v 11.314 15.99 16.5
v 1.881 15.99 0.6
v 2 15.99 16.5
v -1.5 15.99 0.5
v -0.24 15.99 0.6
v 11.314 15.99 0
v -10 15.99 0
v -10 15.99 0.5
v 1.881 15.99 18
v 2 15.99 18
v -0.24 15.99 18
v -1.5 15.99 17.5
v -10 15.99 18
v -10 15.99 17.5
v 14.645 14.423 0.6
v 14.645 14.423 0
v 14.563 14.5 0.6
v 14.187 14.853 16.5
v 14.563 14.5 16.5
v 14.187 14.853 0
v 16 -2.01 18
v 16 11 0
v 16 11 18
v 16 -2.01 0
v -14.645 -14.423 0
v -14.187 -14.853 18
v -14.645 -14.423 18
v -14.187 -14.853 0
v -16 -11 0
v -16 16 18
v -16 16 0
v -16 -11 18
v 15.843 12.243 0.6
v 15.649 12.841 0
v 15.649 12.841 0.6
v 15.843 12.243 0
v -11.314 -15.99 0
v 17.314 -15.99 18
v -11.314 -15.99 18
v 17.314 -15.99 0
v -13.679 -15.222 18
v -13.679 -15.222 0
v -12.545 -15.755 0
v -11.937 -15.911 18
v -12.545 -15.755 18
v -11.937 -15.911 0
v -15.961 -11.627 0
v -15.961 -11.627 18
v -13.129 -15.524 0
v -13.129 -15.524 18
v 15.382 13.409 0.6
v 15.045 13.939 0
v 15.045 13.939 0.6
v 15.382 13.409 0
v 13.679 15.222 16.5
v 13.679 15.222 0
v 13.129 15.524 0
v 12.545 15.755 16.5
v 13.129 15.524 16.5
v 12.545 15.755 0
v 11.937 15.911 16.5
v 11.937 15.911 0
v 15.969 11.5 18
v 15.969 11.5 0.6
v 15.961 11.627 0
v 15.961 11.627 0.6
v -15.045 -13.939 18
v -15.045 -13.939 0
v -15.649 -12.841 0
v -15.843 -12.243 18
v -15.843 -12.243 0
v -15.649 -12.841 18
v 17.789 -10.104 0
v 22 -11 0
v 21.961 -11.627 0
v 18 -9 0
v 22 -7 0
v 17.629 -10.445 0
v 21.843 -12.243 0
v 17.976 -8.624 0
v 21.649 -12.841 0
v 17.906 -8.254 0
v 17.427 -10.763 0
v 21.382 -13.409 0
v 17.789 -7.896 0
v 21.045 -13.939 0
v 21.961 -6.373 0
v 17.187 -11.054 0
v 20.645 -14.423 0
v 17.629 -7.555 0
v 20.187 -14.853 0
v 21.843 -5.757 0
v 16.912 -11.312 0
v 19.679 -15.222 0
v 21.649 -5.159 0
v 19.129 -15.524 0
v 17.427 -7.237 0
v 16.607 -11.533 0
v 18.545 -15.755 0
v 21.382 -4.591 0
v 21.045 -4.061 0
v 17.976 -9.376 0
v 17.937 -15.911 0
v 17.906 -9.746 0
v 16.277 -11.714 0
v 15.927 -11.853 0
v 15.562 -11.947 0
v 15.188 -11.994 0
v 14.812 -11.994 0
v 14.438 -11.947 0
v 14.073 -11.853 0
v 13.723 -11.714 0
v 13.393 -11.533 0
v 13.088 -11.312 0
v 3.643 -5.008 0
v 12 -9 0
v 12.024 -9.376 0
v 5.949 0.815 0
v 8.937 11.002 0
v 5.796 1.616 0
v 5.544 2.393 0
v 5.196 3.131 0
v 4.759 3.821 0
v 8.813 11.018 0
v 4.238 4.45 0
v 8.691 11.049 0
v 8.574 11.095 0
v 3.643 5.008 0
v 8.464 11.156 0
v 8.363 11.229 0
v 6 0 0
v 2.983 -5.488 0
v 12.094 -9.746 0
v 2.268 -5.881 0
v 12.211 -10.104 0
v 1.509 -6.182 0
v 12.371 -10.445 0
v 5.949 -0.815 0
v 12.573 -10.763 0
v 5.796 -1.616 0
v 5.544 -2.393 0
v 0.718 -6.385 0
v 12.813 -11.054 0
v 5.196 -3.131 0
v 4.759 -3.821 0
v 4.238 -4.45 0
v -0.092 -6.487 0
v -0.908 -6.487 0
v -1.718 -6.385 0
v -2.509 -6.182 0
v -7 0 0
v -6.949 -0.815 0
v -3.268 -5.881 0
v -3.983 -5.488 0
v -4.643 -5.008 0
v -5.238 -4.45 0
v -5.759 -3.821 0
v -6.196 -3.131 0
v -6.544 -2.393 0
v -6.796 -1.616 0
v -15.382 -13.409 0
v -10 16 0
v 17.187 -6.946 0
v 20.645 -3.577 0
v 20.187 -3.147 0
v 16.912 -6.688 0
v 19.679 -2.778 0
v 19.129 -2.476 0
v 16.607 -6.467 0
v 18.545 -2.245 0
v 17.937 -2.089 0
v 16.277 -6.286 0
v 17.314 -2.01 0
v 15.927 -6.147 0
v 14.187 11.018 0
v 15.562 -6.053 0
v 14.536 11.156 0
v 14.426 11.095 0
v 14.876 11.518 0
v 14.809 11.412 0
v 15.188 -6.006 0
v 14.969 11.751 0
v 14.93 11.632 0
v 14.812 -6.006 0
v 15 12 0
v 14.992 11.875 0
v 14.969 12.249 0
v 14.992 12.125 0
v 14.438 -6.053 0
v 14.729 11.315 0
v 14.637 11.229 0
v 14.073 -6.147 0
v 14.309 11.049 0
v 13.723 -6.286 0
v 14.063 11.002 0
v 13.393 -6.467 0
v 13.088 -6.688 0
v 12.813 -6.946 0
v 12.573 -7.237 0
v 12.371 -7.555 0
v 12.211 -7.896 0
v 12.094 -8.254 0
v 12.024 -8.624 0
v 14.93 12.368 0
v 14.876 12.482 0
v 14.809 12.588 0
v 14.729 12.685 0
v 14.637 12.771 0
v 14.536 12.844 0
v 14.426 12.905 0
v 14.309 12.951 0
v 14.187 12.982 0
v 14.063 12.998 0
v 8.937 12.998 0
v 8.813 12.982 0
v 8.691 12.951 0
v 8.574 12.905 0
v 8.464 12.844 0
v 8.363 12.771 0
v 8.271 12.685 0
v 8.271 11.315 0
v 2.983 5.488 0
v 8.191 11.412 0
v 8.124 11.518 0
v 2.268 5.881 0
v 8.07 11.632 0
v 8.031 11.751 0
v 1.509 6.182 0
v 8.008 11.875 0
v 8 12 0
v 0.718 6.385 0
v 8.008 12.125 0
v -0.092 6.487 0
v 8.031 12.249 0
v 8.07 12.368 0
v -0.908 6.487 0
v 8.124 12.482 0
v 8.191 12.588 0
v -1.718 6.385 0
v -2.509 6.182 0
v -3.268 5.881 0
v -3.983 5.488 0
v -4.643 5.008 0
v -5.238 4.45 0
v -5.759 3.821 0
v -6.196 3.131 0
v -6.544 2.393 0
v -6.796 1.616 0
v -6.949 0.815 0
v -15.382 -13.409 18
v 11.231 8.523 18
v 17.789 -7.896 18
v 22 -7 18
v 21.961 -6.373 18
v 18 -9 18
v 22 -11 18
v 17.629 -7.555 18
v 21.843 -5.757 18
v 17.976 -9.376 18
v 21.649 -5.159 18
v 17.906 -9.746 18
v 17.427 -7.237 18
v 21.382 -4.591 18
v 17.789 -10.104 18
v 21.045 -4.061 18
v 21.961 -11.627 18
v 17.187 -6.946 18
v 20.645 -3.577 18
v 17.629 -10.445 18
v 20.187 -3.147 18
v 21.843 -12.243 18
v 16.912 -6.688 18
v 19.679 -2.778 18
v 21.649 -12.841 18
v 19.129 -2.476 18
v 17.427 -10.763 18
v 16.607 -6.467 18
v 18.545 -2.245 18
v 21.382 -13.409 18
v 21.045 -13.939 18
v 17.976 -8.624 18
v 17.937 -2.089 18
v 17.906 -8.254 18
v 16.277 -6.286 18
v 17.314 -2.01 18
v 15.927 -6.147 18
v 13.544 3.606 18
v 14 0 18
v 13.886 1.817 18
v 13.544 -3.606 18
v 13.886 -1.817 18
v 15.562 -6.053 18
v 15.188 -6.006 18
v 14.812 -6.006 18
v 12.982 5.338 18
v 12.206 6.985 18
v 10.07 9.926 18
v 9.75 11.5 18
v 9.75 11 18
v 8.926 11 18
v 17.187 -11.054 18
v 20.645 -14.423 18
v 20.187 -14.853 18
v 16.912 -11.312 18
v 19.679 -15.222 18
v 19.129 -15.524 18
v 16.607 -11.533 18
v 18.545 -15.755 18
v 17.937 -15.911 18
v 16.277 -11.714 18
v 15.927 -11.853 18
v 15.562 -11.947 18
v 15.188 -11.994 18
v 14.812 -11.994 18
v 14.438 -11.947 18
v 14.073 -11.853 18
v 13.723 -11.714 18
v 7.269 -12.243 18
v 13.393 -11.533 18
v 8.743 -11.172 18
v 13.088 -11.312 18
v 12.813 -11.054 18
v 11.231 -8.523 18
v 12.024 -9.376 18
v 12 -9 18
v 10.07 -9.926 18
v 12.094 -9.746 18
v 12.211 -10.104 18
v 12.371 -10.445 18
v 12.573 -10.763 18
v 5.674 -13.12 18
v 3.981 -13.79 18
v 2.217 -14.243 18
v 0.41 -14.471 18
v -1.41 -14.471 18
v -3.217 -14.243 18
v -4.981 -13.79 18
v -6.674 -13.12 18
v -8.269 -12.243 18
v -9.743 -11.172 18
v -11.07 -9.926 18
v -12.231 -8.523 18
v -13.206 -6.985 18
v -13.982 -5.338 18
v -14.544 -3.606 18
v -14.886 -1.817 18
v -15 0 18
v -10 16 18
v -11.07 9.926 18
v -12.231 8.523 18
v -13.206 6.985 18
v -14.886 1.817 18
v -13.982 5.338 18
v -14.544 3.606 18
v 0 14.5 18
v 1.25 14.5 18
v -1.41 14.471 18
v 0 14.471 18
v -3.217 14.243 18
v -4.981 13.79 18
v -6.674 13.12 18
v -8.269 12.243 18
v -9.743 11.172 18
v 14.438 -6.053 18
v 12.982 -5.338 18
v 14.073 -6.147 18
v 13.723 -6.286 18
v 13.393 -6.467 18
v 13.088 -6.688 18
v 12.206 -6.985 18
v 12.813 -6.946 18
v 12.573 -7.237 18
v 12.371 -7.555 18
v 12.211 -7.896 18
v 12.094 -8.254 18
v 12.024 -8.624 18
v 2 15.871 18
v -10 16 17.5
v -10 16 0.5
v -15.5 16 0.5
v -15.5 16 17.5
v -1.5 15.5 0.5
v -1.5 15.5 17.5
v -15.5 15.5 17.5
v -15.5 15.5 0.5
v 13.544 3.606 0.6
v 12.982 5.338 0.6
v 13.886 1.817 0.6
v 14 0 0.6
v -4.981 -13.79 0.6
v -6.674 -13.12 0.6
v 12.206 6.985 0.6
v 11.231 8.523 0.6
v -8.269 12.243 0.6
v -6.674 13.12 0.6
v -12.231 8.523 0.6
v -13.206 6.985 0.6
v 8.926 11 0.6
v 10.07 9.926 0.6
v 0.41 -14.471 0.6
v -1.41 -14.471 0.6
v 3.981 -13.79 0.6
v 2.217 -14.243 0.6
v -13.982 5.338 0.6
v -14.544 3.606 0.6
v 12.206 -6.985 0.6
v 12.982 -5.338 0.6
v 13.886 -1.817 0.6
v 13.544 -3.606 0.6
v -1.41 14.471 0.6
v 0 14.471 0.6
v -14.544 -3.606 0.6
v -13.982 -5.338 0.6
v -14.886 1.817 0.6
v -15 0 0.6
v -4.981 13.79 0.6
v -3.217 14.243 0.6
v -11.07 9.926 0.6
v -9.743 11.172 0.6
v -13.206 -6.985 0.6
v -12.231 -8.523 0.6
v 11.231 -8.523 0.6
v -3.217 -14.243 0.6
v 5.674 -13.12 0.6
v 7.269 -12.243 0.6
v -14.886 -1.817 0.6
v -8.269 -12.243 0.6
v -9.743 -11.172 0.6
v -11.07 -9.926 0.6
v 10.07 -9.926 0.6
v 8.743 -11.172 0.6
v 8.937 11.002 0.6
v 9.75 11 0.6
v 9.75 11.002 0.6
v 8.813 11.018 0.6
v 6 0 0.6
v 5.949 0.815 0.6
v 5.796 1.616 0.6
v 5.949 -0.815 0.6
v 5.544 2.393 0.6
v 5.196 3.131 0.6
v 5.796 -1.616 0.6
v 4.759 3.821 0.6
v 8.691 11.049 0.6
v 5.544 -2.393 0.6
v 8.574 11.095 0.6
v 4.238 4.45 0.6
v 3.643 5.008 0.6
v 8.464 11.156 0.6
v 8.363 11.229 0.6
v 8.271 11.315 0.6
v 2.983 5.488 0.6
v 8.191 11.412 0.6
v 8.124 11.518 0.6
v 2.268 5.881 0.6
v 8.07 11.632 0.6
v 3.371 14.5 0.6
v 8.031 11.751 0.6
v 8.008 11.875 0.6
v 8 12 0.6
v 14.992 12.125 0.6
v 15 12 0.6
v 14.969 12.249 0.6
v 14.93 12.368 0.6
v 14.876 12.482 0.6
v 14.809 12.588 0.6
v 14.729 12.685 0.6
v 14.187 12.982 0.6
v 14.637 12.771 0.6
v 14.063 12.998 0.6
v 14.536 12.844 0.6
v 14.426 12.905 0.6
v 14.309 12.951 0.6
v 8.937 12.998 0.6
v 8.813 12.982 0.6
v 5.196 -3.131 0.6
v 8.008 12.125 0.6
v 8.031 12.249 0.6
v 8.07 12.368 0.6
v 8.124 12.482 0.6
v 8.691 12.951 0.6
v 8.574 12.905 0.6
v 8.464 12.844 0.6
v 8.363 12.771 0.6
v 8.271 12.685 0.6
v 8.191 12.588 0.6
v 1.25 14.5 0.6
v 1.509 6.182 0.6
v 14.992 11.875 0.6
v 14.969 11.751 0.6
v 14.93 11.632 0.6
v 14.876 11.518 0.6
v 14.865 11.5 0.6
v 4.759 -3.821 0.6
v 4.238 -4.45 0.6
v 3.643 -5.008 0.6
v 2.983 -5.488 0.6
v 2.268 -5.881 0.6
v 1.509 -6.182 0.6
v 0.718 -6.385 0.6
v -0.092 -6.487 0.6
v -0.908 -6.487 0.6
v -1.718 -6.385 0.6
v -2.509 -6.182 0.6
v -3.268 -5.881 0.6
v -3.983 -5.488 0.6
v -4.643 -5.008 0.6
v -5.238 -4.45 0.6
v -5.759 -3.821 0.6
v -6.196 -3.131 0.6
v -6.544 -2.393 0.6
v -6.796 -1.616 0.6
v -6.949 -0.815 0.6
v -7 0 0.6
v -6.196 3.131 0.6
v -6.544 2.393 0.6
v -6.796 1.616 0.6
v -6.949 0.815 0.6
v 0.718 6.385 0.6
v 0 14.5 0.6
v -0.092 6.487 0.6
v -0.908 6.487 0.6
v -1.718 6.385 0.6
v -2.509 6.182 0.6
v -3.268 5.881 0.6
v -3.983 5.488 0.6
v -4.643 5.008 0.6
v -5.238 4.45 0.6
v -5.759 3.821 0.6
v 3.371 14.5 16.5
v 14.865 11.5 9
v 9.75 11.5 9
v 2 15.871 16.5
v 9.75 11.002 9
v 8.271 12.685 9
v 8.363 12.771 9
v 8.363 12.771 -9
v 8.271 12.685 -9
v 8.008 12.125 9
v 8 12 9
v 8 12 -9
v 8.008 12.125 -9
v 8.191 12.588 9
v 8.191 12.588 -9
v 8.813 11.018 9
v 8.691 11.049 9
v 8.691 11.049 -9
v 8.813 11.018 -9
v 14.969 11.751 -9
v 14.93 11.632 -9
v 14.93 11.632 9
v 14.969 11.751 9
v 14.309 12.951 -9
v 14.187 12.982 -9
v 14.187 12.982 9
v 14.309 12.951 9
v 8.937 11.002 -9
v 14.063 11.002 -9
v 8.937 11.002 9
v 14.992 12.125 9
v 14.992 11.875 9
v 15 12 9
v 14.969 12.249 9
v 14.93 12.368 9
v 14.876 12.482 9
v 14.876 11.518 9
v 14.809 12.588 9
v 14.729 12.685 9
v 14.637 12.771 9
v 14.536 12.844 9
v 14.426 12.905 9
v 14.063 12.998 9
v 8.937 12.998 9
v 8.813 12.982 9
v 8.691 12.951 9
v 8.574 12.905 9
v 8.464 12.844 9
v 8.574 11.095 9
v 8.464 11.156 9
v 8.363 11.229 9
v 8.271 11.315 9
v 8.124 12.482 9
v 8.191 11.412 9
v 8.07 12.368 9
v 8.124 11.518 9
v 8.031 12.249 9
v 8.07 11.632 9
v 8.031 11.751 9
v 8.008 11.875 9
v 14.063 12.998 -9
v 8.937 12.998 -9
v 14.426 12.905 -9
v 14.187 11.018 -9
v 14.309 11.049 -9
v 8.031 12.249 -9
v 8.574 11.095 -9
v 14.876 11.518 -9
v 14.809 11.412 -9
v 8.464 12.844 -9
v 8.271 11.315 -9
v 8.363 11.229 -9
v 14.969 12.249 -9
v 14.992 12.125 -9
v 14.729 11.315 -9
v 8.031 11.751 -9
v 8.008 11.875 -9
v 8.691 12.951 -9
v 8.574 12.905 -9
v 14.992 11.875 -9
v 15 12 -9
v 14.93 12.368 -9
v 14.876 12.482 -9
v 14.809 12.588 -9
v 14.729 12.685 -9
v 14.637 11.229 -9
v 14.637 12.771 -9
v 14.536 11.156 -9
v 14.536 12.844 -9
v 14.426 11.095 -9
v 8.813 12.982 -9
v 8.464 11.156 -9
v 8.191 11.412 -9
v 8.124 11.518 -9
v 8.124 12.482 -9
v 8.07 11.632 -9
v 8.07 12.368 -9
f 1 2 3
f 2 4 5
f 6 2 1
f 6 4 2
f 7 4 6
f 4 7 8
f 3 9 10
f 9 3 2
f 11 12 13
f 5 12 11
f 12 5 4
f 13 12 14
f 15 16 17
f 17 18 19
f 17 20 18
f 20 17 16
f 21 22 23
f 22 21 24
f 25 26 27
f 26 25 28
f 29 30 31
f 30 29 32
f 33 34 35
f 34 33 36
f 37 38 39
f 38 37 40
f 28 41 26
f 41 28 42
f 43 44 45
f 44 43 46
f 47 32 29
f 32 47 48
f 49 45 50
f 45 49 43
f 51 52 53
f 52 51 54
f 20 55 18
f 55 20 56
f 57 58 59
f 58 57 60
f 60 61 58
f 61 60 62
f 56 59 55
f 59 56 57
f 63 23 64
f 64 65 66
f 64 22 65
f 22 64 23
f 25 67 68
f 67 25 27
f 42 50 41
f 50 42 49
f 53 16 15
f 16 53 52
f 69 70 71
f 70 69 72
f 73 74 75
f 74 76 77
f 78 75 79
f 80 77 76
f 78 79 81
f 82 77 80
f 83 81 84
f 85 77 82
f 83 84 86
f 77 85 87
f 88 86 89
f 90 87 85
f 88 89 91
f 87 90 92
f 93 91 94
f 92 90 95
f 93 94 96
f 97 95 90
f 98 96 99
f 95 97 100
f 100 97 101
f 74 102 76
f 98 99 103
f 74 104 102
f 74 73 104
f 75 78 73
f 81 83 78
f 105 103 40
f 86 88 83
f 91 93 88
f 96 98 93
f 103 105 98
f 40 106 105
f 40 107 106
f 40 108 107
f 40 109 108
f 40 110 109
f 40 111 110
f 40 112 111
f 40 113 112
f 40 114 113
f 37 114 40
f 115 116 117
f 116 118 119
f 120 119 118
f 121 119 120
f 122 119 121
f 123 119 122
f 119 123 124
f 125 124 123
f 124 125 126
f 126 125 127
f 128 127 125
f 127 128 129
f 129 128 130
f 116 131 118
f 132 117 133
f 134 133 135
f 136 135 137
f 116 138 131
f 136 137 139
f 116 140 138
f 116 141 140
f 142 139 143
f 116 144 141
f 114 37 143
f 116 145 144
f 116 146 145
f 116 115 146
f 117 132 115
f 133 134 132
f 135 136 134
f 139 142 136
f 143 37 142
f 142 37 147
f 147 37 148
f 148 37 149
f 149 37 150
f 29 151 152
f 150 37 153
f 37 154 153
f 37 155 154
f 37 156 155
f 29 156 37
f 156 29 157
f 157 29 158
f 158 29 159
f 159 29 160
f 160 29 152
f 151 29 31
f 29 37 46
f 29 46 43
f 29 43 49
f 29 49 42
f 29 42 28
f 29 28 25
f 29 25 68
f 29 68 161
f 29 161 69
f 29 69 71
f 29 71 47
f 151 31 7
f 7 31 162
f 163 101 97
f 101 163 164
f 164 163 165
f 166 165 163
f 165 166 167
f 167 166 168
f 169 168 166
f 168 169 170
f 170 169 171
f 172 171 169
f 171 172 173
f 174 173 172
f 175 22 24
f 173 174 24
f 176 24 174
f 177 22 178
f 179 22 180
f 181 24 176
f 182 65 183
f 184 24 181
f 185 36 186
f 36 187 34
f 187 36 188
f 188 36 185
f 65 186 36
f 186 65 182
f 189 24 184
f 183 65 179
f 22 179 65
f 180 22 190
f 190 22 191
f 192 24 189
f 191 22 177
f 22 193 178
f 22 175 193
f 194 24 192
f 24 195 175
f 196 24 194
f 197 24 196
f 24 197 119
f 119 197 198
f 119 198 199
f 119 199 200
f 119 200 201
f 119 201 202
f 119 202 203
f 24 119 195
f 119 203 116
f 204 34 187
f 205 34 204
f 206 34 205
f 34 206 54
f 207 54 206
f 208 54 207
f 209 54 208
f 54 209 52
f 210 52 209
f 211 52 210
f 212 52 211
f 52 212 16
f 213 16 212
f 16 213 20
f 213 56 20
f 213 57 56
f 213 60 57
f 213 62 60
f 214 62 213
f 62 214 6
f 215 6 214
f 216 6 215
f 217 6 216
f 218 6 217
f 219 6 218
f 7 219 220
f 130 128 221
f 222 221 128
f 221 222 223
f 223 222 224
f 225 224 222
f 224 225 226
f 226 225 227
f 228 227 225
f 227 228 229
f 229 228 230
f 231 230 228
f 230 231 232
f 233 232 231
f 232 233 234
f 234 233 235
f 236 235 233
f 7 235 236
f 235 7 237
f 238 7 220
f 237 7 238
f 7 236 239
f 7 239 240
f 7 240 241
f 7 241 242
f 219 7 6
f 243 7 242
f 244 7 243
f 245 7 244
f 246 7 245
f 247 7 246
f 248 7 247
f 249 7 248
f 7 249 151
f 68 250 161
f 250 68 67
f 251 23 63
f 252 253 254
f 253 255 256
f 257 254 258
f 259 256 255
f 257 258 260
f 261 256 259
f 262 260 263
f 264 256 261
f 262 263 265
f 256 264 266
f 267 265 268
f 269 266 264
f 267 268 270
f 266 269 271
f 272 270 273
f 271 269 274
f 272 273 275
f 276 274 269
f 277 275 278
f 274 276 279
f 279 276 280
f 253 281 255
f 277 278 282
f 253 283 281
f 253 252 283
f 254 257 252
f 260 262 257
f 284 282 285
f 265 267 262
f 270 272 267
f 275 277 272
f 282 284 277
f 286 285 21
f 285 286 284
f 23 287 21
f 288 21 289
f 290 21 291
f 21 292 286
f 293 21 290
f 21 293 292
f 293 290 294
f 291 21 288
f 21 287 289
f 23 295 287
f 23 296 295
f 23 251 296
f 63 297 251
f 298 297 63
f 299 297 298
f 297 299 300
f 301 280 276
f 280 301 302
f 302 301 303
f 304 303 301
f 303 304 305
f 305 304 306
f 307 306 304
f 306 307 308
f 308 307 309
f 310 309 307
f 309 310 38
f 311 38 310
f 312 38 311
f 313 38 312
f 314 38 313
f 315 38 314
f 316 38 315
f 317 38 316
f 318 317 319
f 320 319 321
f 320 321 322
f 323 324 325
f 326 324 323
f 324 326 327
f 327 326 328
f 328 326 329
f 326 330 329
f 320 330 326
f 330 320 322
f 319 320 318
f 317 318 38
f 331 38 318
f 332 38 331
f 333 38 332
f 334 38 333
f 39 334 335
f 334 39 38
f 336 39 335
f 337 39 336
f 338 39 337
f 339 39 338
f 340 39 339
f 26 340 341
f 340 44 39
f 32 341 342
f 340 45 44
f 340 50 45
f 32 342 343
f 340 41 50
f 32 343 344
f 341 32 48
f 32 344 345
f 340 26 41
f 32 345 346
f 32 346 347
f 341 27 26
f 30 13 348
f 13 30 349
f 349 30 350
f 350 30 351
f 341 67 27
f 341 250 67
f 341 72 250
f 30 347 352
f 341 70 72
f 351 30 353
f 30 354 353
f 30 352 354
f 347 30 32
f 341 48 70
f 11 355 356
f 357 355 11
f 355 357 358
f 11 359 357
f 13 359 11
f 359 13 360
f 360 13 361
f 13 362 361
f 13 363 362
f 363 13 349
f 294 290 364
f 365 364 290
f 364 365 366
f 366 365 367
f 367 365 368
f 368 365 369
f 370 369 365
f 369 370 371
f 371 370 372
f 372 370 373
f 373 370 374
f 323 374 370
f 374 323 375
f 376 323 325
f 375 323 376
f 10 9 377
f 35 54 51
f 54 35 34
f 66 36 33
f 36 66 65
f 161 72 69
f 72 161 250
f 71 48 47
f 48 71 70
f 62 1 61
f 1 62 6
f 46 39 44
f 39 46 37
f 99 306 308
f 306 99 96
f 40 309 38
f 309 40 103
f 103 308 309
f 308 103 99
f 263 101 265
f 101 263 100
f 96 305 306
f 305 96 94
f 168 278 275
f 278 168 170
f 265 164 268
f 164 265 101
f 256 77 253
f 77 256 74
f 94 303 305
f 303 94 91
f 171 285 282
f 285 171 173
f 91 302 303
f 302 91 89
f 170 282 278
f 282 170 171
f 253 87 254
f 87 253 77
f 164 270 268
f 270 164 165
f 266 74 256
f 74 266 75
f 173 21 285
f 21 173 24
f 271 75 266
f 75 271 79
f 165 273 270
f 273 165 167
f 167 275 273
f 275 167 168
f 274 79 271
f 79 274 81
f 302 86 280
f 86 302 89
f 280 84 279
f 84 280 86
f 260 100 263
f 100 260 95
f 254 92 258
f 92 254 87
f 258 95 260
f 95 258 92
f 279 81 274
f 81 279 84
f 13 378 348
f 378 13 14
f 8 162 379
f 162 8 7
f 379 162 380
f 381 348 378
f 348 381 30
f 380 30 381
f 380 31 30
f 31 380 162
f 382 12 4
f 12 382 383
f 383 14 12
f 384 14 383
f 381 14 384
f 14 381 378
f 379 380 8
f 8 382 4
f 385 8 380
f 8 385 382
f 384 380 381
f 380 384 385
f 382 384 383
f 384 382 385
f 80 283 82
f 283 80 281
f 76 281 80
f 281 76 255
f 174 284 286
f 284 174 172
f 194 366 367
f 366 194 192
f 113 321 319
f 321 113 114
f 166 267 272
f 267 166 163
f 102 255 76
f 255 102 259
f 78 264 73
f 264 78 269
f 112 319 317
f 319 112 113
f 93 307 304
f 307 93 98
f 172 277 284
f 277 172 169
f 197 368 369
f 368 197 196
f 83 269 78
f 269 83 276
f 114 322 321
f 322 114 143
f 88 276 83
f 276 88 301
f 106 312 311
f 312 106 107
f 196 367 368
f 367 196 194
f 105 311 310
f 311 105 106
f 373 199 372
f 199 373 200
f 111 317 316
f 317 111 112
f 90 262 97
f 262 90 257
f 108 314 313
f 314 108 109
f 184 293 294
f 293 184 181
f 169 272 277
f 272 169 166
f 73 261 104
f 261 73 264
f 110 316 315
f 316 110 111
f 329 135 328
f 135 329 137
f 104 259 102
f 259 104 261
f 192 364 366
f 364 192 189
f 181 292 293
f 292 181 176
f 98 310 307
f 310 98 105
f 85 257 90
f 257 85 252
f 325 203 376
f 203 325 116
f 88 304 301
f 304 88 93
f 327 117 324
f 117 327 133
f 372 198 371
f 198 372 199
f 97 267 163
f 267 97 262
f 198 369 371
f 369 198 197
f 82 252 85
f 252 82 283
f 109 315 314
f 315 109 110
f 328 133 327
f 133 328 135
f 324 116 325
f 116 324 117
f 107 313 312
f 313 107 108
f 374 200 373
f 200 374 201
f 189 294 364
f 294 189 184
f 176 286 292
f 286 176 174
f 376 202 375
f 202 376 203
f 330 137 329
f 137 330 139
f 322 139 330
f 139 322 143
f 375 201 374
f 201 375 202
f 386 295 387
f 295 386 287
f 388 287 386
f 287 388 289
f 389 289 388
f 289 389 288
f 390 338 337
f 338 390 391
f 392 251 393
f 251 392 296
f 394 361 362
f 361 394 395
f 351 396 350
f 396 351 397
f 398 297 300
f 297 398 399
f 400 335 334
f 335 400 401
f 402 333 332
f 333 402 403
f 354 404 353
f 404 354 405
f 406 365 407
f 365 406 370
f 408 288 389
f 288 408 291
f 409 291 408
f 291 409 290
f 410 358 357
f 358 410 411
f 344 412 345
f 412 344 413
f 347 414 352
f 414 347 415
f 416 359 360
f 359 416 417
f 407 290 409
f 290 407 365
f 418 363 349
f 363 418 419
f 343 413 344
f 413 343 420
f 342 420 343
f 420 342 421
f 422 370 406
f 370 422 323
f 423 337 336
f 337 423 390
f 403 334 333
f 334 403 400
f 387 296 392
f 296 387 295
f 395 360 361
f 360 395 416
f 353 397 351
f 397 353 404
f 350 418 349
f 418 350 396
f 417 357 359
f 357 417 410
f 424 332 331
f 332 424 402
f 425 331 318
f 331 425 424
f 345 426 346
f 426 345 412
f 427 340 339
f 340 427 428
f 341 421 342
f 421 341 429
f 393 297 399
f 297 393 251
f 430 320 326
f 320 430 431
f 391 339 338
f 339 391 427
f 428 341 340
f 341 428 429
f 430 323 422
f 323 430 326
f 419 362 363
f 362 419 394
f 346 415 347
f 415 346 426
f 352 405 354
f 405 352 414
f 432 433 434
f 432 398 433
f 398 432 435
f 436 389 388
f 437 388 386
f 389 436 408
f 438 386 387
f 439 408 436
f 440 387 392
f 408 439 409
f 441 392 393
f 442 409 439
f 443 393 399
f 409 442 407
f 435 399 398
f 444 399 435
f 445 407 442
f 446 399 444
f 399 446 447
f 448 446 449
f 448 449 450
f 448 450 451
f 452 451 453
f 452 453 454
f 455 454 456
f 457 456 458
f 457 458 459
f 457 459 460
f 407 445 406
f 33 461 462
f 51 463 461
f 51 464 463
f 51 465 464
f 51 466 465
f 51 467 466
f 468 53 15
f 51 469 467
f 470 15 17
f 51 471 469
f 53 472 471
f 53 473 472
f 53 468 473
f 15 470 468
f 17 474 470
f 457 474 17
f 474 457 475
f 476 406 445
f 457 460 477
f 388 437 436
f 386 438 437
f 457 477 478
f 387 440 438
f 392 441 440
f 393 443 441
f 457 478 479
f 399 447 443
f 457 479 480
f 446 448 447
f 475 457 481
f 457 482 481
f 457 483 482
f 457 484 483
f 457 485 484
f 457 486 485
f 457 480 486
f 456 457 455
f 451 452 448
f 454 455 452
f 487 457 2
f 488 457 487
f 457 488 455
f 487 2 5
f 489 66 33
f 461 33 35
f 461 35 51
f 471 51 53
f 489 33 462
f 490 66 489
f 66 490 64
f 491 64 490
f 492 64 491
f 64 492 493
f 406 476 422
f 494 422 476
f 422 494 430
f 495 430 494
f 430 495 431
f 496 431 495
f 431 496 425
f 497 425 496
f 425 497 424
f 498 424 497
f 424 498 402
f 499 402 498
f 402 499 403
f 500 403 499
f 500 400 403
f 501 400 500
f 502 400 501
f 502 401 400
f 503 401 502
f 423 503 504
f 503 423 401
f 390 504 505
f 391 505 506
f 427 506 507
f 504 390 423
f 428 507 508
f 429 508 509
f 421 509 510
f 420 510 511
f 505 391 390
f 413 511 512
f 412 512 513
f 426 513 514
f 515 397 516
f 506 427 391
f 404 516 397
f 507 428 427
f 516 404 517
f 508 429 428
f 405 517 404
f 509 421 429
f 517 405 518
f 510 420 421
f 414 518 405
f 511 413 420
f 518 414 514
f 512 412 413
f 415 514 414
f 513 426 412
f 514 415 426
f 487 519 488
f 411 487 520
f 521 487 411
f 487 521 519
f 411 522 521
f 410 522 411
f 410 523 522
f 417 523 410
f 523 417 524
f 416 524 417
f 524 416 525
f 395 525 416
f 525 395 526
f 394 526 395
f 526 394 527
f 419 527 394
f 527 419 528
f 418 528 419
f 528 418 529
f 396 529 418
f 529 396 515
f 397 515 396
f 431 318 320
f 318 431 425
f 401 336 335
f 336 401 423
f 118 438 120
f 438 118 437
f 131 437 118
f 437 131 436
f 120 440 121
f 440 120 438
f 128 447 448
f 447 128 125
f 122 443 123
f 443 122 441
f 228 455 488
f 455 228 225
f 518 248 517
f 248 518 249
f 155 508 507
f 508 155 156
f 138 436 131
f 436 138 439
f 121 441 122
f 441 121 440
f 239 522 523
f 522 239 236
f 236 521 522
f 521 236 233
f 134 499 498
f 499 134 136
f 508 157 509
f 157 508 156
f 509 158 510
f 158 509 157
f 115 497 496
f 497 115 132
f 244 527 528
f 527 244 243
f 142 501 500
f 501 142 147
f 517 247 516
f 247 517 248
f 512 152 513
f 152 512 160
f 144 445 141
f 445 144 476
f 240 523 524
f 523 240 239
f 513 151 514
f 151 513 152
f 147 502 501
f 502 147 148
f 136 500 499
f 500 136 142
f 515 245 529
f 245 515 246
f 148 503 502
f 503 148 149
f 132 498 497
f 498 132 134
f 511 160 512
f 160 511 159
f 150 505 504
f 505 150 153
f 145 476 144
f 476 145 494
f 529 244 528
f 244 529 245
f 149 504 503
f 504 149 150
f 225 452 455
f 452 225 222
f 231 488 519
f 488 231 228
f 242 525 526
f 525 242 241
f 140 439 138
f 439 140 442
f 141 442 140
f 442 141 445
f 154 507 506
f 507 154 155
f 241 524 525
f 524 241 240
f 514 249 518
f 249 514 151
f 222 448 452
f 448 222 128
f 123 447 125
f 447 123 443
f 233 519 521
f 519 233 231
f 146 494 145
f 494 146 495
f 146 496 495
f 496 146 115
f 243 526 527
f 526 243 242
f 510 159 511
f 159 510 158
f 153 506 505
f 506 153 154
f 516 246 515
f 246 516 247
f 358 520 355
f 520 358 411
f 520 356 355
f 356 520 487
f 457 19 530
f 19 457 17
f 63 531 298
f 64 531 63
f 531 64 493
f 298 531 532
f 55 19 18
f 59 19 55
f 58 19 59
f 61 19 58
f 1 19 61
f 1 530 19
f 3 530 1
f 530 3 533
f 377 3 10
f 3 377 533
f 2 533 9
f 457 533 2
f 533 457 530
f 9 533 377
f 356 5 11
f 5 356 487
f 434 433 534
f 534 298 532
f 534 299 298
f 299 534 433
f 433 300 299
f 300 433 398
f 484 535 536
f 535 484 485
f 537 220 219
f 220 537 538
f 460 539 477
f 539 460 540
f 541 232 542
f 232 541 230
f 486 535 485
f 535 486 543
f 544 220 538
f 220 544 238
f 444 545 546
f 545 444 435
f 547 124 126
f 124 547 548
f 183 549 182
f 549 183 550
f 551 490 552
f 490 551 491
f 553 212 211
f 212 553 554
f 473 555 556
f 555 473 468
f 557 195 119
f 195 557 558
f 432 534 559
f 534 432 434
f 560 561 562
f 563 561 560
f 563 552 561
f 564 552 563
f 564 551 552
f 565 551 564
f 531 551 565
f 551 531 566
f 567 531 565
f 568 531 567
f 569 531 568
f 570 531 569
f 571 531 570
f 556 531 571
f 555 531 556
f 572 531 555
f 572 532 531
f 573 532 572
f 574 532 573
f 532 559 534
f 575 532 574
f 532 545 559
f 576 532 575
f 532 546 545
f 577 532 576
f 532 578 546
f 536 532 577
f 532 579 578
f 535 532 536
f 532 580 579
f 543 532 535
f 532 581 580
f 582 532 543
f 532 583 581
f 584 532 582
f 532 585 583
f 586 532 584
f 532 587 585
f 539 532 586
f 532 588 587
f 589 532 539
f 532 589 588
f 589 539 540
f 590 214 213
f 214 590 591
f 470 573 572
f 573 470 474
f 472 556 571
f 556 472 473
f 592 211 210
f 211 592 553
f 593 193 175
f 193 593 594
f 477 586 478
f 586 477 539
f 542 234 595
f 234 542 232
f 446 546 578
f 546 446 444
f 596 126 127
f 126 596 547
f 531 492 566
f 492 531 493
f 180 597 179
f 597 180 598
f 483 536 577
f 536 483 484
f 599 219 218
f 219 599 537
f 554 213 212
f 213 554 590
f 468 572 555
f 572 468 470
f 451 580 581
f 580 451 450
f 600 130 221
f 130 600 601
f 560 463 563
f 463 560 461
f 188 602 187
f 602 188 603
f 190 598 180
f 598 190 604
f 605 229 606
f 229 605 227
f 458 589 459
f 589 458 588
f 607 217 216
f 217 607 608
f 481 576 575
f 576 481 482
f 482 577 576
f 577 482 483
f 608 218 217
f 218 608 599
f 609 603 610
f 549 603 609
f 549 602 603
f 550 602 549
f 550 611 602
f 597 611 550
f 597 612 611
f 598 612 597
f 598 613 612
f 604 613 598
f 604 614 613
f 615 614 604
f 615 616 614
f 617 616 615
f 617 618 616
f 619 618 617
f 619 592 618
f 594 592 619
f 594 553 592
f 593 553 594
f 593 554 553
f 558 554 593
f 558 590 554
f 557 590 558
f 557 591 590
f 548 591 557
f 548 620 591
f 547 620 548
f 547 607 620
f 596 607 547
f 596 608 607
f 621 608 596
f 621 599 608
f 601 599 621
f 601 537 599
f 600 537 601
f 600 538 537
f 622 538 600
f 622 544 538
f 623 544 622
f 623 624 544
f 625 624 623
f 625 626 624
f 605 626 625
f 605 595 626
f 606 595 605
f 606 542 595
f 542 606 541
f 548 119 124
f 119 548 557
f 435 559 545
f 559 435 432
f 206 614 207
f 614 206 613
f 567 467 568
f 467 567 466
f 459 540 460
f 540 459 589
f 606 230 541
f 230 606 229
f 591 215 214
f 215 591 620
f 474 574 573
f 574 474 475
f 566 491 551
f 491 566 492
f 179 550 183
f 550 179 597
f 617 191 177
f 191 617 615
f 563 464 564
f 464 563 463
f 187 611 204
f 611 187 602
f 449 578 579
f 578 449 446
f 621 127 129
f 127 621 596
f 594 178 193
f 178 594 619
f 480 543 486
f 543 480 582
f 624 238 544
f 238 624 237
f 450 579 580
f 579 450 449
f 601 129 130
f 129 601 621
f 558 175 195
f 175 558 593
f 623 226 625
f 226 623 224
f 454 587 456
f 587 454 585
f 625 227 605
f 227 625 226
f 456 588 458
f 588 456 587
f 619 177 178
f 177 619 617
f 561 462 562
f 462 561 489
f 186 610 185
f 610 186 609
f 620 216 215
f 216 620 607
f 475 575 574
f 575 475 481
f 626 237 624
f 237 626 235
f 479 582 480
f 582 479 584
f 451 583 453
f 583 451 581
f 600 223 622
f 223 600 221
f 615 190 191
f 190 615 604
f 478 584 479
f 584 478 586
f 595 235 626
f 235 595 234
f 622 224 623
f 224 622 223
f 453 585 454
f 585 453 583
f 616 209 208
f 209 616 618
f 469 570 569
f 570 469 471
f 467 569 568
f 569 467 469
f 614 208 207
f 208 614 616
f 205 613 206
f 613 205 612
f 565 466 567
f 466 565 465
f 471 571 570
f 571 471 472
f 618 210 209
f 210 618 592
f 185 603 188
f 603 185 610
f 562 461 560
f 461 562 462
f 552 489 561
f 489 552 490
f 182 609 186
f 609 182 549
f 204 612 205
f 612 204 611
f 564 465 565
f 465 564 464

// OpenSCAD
$fn = 50;


union() {
	difference() {
		union() {
			hull() {
				translate(v = [-11.0000000000, 11.0000000000, 0]) {
					cylinder(h = 18, r = 5);
				}
				translate(v = [11.0000000000, 11.0000000000, 0]) {
					cylinder(h = 18, r = 5);
				}
				translate(v = [-11.0000000000, -11.0000000000, 0]) {
					cylinder(h = 18, r = 5);
				}
				translate(v = [11.0000000000, -11.0000000000, 0]) {
					cylinder(h = 18, r = 5);
				}
			}
			translate(v = [7.5000000000, -9.0000000000, 0]) {
				hull() {
					translate(v = [-9.5000000000, 2.0000000000, 0]) {
						cylinder(h = 18, r = 5);
					}
					translate(v = [9.5000000000, 2.0000000000, 0]) {
						cylinder(h = 18, r = 5);
					}
					translate(v = [-9.5000000000, -2.0000000000, 0]) {
						cylinder(h = 18, r = 5);
					}
					translate(v = [9.5000000000, -2.0000000000, 0]) {
						cylinder(h = 18, r = 5);
					}
				}
			}
			translate(v = [-16.0000000000, 10.0000000000, 0]) {
				cube(size = [6, 6, 18]);
			}
		}
		union() {
			translate(v = [-15.5000000000, 15.5000000000, 0.5000000000]) {
				cube(size = [14, 0.5000000000, 17.0000000000]);
			}
			translate(v = [15.0000000000, -9.0000000000, -100.0000000000]) {
				cylinder(h = 200, r = 3.0000000000);
			}
			translate(v = [-0.5000000000, 0.0000000000, 0.6000000000]) {
				cylinder(h = 20.4000000000, r = 14.5000000000);
			}
			translate(v = [-0.5000000000, 0.0000000000, -9.0000000000]) {
				cylinder(h = 18, r = 6.5000000000);
			}
			translate(v = [0.0000000000, 11.5000000000, 0.6000000000]) {
				cube(size = [16.0000000000, 3, 20.4000000000]);
			}
			translate(v = [2.0000000000, 11.5000000000, 16.5000000000]) {
				cube(size = [14.0000000000, 6, 1.5000000000]);
			}
			translate(v = [-3.0000000000, 18.7500000000, 0.6000000000]) {
				rotate(a = [0, 0, -45]) {
					cube(size = [10, 1.5000000000, 20.4000000000]);
				}
			}
			translate(v = [2.2500000000, 11.0000000000, 0.6000000000]) {
				cube(size = [7.5000000000, 2, 17.4000000000]);
			}
		}
	}
	union() {
		translate(v = [11.5000000000, 12, -9.0000000000]) {
			rotate(a = [0, 0, 0]) {
				difference() {
					union() {
						hull() {
							translate(v = [2.5000000000, 0, 0]) {
								cylinder(h = 18, r = 1.0000000000, r1 = 1.0000000000, r2 = 1.0000000000);
							}
							translate(v = [-2.5000000000, 0, 0]) {
								cylinder(h = 18, r = 1.0000000000, r1 = 1.0000000000, r2 = 1.0000000000);
							}
						}
					}
					union();
				}
			}
		}
	}
}
